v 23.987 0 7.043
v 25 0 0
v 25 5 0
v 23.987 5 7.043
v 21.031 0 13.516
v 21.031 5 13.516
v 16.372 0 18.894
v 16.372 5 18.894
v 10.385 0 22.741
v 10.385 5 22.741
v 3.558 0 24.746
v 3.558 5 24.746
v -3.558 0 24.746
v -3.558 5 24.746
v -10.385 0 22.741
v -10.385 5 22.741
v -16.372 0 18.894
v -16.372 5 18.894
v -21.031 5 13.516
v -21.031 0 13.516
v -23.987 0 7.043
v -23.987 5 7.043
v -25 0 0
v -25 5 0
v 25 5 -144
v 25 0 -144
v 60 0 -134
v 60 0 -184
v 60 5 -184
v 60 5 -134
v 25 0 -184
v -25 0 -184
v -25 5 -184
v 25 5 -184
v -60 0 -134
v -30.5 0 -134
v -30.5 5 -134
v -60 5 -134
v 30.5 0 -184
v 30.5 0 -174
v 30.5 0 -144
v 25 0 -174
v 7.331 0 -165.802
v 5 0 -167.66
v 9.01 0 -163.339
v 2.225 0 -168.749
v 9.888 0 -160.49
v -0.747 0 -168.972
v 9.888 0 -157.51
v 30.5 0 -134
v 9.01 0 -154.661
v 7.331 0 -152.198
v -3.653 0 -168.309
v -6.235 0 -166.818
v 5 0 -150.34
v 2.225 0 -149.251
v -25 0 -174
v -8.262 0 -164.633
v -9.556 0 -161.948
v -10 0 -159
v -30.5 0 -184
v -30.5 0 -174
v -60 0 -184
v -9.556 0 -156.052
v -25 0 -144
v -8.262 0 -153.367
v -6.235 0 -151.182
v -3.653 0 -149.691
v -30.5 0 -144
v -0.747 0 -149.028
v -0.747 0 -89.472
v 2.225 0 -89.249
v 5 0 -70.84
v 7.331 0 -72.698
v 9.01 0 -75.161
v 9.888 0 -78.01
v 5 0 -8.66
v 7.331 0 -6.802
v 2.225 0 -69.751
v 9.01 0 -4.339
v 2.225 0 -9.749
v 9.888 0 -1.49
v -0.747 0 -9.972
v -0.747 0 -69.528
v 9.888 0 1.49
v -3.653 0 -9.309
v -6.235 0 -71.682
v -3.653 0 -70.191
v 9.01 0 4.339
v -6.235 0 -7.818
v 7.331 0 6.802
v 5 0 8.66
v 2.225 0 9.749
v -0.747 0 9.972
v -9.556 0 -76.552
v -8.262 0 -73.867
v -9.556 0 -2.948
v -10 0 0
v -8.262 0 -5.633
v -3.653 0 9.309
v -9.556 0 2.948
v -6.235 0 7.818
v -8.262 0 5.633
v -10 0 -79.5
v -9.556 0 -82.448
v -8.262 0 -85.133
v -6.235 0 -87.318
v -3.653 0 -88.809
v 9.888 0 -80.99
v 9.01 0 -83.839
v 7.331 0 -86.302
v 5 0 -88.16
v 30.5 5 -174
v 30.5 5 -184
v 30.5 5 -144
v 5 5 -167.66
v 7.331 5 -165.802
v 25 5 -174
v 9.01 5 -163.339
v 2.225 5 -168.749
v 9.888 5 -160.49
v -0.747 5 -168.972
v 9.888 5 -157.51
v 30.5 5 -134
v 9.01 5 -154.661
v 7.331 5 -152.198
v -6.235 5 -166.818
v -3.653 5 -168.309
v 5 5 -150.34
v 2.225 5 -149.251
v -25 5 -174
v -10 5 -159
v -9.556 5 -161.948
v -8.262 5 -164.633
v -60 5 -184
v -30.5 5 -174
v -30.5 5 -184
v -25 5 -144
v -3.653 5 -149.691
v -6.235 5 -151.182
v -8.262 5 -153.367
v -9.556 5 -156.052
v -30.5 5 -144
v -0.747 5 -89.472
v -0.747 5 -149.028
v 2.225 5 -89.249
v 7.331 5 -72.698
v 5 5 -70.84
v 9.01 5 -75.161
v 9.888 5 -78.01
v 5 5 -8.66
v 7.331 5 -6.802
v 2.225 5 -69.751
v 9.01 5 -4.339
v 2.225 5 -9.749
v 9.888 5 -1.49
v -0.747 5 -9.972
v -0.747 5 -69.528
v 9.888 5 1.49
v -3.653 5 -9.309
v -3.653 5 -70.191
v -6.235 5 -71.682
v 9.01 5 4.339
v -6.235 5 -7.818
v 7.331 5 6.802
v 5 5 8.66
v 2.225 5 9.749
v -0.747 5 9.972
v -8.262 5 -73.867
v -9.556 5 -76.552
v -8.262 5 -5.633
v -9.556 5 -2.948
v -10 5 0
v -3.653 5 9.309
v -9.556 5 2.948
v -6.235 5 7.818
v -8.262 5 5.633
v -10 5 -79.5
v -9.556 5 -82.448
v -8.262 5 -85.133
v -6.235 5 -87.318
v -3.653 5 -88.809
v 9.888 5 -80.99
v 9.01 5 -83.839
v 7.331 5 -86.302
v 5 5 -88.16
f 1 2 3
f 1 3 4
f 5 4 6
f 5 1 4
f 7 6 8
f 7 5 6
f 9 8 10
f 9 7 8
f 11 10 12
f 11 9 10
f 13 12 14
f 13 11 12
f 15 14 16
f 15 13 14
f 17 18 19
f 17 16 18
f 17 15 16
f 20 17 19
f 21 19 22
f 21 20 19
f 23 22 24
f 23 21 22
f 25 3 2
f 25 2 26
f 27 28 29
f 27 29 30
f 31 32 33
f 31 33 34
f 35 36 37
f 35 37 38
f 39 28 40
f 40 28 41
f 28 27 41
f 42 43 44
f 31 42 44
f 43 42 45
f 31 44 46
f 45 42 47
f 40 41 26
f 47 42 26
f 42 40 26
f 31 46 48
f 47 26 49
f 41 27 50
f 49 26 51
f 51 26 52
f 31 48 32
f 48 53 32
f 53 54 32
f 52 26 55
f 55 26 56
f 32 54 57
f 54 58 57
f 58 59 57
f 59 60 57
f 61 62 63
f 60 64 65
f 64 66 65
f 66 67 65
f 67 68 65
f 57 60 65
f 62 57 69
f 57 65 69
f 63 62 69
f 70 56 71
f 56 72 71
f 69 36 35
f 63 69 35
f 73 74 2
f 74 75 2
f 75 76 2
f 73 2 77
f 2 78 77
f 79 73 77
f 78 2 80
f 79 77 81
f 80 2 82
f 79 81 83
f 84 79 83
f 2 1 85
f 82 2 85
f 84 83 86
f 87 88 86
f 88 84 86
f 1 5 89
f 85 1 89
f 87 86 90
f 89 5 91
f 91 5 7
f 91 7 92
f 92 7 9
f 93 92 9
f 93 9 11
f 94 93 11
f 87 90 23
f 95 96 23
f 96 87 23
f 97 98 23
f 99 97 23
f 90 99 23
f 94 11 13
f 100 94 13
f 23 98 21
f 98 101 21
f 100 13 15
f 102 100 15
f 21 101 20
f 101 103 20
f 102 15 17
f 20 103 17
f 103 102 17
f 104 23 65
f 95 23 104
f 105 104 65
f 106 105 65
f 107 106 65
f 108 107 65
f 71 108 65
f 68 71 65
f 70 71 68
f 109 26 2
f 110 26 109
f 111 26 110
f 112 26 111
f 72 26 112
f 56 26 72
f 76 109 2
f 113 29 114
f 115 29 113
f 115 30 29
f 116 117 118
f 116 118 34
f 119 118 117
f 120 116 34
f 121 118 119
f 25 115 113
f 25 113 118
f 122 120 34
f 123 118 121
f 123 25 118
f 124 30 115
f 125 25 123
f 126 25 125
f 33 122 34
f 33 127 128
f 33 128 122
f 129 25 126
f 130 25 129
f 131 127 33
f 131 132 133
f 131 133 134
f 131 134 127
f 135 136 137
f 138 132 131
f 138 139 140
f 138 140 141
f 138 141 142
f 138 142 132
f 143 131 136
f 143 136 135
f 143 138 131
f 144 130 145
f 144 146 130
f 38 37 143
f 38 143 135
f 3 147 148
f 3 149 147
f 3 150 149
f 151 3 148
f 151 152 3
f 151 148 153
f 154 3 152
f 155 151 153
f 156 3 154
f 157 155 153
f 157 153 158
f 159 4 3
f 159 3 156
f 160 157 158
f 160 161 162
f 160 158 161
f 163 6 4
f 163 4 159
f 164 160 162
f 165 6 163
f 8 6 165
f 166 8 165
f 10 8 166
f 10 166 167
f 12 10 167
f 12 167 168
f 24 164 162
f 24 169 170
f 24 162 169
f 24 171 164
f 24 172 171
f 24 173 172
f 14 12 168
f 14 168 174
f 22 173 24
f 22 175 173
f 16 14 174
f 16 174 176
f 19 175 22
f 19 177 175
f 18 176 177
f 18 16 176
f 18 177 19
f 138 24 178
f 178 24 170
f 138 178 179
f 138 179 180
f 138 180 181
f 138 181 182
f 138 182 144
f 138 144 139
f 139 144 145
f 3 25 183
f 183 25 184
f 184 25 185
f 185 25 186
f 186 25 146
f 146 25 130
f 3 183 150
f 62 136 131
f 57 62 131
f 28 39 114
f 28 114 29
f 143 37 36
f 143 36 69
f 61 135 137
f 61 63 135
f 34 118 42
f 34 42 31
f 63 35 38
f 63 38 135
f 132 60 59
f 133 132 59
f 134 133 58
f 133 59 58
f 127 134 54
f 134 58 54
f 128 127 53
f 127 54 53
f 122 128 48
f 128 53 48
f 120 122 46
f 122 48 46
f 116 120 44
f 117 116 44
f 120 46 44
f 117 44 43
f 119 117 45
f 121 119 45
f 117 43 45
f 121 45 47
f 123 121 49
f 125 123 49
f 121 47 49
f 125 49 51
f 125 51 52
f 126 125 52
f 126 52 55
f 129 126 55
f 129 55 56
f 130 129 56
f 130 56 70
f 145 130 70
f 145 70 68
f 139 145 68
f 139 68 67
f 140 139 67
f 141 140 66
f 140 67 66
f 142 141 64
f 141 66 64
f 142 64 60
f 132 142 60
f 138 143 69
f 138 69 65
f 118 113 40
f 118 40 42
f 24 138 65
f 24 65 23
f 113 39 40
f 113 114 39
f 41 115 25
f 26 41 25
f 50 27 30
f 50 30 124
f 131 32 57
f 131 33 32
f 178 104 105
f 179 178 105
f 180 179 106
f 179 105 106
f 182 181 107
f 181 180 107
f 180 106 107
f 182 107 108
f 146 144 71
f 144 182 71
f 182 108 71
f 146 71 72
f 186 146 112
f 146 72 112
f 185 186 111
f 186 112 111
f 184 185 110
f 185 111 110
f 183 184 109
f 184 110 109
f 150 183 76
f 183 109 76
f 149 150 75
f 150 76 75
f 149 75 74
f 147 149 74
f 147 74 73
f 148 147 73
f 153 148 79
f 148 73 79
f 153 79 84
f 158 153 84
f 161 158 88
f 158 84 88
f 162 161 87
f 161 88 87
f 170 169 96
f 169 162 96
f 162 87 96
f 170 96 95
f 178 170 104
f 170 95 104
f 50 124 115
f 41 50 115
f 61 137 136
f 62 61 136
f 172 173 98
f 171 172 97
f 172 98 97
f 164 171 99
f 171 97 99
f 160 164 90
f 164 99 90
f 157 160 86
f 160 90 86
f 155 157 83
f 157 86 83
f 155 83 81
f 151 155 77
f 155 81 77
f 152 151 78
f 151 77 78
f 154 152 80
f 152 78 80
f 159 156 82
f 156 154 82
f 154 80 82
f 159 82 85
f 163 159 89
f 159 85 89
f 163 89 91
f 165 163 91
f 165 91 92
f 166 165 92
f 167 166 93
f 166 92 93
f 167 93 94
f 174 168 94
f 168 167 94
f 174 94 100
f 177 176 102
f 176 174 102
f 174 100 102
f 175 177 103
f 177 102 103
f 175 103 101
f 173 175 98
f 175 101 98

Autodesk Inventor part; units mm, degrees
ref_plane "YZ Plane" through (0, 0, 0) normal (1, 0, 0) x (0, 1, 0)
ref_plane "XZ Plane" through (0, 0, 0) normal (0, 1, 0) x (-1, 0, 0)
ref_plane "XY Plane" through (0, 0, 0) normal (0, 0, 1) x (1, 0, 0)
sketch "スケッチ1" plane through (0, 0, 0) normal (0, 1, 0) x (-1, 0, 0)
  line L0 (25, 0) -> (-25, 0)
  line L1 (-25, 0) -> (-25, -159)
  line L2 (-25, -159) -> (25, -159)
  line L3 (25, -159) -> (25, 0)
  circle A0 centre (0, 0) radius 25
  circle A1 centre (0, 0) radius 57 construction
  circle A2 centre (0, -79.5) radius 22.5 construction
  circle A3 centre (0, 0) radius 75 construction
  circle A4 centre (0, -79.5) radius 10
  circle A5 centre (0, 0) radius 10
  circle A6 centre (0, -159) radius 10
  circle A7 centre (0, -159) radius 57 construction
  circle A8 centre (0, -159) radius 25
  dimension "d0" = 114
  dimension "d1" = 45
  dimension "d2" = 150
  dimension "d3" = 20
  dimension "d4" = 20
  dimension "d5" = 50
  dimension "d8" = 20
extrude "押し出し1" add sketch "スケッチ1" along normal blind 5 contours A0 L0 A5 | L0 A5 A0 | L3 A8 L1 A0 | A8 L2 A6 | L2 A6 A8
sketch "スケッチ2" plane through (0, 0, 0) normal (0, -1, 0) x (1, 0, 0)
  line L0 (60, -134) -> (-60, -134)
  line L1 (-60, -134) -> (-60, -184)
  line L2 (-60, -184) -> (60, -184)
  line L3 (60, -184) -> (60, -134)
  line L4 (25, 0) -> (25, -159) projected
  arc A0 (25, 0) -> (-25, 0) centre (0, 0) ccw projected
  line L5 (-25, -159) -> (-25, 0) projected
  arc A1 (-25, -159) -> (25, -159) centre (0, -159) ccw projected
  circle A2 centre (0, 0) radius 10 projected
  circle A3 centre (0, -79.5) radius 10 projected
  circle A4 centre (0, -159) radius 10 projected
  arc A5 (-25, -159) -> (25, -159) centre (0, -159) ccw projected
  point P0 (0, -184)
  point P1 (25, -134)
  point P2 (0, -184)
  point P3 (-25, -134)
  dimension "d9" = 120
  dimension "d10" = 50
extrude "押し出し2" add sketch "スケッチ2" against normal up to surface (5 mm away) contours L3 L2 A1 L4 L0 | L5 A1 L2 L1 L0
sketch "スケッチ3" plane through (0, 5, 0) normal (0, 1, 0) x (1, 0, 0)
  line L0 (-60, 184) -> (60, 184) projected
  line L1 (-25, 134) -> (25, 134)
  line L2 (25, 134) -> (25, 184)
  line L3 (25, 184) -> (-25, 184)
  line L4 (-25, 184) -> (-25, 134)
  line L5 (-25, 184) -> (-30.5, 184)
  line L6 (-30.5, 184) -> (-30.5, 174)
  line L7 (-30.5, 174) -> (-25, 174)
  line L8 (-25, 174) -> (-25, 184)
  line L9 (25, 184) -> (30.5, 184)
  line L10 (30.5, 184) -> (30.5, 174)
  line L11 (30.5, 174) -> (25, 174)
  line L12 (25, 174) -> (25, 184)
  line L13 (-25, 134) -> (-60, 134) projected
  line L14 (-25, 134) -> (-30.5, 134)
  line L15 (-30.5, 134) -> (-30.5, 144)
  line L16 (-30.5, 144) -> (-25, 144)
  line L17 (-25, 144) -> (-25, 134)
  line L18 (25, 134) -> (30.5, 134)
  line L19 (30.5, 134) -> (30.5, 144)
  line L20 (30.5, 144) -> (25, 144)
  line L21 (25, 144) -> (25, 134)
  point P0 (0, 0)
  point P1 (25, 174)
  point P2 (-25, 144)
  point P3 (-25, 174)
  point P4 (-25, 184)
  dimension "d13" = 5.5
  dimension "d14" = 5.5
  dimension "d15" = 10
extrude "押し出し3" cut sketch "スケッチ3" against normal through all contours L0 L4 L7 L6 | L0 L10 L11 L2 | L4 L13 L15 L16 | L20 L19 L18 L2
equation "\"d14\" = d13"
properties part number "ギアプレート"
